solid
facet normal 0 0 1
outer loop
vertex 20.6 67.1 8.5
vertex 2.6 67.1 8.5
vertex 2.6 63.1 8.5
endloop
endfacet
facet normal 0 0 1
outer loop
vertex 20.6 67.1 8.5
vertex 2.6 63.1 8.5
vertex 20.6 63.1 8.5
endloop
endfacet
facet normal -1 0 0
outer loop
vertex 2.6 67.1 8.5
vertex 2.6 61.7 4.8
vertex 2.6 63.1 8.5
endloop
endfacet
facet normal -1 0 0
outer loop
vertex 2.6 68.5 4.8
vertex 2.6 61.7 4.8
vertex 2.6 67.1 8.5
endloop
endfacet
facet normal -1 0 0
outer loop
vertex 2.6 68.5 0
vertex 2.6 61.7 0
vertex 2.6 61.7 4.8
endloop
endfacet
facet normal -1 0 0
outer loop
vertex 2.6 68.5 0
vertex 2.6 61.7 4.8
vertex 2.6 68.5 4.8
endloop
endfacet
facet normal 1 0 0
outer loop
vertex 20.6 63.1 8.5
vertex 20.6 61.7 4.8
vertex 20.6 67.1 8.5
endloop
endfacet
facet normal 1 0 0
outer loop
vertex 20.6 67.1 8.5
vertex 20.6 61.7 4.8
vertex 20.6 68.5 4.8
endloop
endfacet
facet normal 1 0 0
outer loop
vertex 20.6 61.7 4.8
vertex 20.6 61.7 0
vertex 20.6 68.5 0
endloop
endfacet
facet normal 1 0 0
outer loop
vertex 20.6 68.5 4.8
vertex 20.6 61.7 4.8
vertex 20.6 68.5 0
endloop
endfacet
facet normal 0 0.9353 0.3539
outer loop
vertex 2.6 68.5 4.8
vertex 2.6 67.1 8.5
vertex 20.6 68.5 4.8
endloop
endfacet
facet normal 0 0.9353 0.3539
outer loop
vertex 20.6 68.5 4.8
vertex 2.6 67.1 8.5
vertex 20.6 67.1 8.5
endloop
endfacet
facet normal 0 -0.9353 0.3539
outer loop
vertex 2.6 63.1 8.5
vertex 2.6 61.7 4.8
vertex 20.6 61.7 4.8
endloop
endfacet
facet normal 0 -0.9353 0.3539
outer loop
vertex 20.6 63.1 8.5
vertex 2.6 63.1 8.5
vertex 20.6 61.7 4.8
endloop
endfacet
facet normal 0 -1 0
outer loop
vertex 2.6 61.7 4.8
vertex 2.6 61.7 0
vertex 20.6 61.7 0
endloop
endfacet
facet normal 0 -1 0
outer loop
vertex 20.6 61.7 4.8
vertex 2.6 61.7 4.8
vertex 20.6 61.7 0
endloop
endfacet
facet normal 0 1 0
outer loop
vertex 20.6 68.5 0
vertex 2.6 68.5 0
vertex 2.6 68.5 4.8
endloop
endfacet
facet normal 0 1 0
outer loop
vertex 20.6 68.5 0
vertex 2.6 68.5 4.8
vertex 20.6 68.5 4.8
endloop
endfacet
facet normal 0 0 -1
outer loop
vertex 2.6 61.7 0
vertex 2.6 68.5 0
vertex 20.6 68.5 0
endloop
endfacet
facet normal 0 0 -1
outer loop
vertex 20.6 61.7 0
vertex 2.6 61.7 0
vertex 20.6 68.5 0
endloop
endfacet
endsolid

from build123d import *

# Parameters (mm, degrees)
SKETCH015_W      = 18
SKETCH015_H      = 6.8
PAD006_DEPTH     = 8.5
CHAMFER002_SIZE2 = 1.4
CHAMFER002_SIZE  = 3.7
CHAMFER003_SIZE2 = 3.7
CHAMFER003_SIZE  = 1.4


with BuildPart() as part:
    # Sketch015 → Pad006 (new body)
    with BuildSketch(Plane.XY):
        with Locations((38.3, 65.1)):
            Rectangle(SKETCH015_W, SKETCH015_H)
    extrude(amount=PAD006_DEPTH)

    # Chamfer002
    chamfer002_edges = [part.edges().sort_by_distance(p)[0] for p in [
        (38.3, 68.5, 8.5),
    ]]
    chamfer002_side = part.faces().sort_by_distance((38.3, 68.5, 4.25))[0]
    chamfer(chamfer002_edges, length=CHAMFER002_SIZE, length2=CHAMFER002_SIZE2, reference=chamfer002_side)

    # Chamfer003
    chamfer003_edges = [part.edges().sort_by_distance(p)[0] for p in [
        (38.3, 61.7, 8.5),
    ]]
    chamfer003_side = part.faces().sort_by_distance((38.3, 64.4, 8.5))[0]
    chamfer(chamfer003_edges, length=CHAMFER003_SIZE, length2=CHAMFER003_SIZE2, reference=chamfer003_side)


with BuildPart() as part_1:
    # Body026 placement: moved
    add(part.part.moved(Location((-26.7, 0, 0))))


solid = part_1.part
